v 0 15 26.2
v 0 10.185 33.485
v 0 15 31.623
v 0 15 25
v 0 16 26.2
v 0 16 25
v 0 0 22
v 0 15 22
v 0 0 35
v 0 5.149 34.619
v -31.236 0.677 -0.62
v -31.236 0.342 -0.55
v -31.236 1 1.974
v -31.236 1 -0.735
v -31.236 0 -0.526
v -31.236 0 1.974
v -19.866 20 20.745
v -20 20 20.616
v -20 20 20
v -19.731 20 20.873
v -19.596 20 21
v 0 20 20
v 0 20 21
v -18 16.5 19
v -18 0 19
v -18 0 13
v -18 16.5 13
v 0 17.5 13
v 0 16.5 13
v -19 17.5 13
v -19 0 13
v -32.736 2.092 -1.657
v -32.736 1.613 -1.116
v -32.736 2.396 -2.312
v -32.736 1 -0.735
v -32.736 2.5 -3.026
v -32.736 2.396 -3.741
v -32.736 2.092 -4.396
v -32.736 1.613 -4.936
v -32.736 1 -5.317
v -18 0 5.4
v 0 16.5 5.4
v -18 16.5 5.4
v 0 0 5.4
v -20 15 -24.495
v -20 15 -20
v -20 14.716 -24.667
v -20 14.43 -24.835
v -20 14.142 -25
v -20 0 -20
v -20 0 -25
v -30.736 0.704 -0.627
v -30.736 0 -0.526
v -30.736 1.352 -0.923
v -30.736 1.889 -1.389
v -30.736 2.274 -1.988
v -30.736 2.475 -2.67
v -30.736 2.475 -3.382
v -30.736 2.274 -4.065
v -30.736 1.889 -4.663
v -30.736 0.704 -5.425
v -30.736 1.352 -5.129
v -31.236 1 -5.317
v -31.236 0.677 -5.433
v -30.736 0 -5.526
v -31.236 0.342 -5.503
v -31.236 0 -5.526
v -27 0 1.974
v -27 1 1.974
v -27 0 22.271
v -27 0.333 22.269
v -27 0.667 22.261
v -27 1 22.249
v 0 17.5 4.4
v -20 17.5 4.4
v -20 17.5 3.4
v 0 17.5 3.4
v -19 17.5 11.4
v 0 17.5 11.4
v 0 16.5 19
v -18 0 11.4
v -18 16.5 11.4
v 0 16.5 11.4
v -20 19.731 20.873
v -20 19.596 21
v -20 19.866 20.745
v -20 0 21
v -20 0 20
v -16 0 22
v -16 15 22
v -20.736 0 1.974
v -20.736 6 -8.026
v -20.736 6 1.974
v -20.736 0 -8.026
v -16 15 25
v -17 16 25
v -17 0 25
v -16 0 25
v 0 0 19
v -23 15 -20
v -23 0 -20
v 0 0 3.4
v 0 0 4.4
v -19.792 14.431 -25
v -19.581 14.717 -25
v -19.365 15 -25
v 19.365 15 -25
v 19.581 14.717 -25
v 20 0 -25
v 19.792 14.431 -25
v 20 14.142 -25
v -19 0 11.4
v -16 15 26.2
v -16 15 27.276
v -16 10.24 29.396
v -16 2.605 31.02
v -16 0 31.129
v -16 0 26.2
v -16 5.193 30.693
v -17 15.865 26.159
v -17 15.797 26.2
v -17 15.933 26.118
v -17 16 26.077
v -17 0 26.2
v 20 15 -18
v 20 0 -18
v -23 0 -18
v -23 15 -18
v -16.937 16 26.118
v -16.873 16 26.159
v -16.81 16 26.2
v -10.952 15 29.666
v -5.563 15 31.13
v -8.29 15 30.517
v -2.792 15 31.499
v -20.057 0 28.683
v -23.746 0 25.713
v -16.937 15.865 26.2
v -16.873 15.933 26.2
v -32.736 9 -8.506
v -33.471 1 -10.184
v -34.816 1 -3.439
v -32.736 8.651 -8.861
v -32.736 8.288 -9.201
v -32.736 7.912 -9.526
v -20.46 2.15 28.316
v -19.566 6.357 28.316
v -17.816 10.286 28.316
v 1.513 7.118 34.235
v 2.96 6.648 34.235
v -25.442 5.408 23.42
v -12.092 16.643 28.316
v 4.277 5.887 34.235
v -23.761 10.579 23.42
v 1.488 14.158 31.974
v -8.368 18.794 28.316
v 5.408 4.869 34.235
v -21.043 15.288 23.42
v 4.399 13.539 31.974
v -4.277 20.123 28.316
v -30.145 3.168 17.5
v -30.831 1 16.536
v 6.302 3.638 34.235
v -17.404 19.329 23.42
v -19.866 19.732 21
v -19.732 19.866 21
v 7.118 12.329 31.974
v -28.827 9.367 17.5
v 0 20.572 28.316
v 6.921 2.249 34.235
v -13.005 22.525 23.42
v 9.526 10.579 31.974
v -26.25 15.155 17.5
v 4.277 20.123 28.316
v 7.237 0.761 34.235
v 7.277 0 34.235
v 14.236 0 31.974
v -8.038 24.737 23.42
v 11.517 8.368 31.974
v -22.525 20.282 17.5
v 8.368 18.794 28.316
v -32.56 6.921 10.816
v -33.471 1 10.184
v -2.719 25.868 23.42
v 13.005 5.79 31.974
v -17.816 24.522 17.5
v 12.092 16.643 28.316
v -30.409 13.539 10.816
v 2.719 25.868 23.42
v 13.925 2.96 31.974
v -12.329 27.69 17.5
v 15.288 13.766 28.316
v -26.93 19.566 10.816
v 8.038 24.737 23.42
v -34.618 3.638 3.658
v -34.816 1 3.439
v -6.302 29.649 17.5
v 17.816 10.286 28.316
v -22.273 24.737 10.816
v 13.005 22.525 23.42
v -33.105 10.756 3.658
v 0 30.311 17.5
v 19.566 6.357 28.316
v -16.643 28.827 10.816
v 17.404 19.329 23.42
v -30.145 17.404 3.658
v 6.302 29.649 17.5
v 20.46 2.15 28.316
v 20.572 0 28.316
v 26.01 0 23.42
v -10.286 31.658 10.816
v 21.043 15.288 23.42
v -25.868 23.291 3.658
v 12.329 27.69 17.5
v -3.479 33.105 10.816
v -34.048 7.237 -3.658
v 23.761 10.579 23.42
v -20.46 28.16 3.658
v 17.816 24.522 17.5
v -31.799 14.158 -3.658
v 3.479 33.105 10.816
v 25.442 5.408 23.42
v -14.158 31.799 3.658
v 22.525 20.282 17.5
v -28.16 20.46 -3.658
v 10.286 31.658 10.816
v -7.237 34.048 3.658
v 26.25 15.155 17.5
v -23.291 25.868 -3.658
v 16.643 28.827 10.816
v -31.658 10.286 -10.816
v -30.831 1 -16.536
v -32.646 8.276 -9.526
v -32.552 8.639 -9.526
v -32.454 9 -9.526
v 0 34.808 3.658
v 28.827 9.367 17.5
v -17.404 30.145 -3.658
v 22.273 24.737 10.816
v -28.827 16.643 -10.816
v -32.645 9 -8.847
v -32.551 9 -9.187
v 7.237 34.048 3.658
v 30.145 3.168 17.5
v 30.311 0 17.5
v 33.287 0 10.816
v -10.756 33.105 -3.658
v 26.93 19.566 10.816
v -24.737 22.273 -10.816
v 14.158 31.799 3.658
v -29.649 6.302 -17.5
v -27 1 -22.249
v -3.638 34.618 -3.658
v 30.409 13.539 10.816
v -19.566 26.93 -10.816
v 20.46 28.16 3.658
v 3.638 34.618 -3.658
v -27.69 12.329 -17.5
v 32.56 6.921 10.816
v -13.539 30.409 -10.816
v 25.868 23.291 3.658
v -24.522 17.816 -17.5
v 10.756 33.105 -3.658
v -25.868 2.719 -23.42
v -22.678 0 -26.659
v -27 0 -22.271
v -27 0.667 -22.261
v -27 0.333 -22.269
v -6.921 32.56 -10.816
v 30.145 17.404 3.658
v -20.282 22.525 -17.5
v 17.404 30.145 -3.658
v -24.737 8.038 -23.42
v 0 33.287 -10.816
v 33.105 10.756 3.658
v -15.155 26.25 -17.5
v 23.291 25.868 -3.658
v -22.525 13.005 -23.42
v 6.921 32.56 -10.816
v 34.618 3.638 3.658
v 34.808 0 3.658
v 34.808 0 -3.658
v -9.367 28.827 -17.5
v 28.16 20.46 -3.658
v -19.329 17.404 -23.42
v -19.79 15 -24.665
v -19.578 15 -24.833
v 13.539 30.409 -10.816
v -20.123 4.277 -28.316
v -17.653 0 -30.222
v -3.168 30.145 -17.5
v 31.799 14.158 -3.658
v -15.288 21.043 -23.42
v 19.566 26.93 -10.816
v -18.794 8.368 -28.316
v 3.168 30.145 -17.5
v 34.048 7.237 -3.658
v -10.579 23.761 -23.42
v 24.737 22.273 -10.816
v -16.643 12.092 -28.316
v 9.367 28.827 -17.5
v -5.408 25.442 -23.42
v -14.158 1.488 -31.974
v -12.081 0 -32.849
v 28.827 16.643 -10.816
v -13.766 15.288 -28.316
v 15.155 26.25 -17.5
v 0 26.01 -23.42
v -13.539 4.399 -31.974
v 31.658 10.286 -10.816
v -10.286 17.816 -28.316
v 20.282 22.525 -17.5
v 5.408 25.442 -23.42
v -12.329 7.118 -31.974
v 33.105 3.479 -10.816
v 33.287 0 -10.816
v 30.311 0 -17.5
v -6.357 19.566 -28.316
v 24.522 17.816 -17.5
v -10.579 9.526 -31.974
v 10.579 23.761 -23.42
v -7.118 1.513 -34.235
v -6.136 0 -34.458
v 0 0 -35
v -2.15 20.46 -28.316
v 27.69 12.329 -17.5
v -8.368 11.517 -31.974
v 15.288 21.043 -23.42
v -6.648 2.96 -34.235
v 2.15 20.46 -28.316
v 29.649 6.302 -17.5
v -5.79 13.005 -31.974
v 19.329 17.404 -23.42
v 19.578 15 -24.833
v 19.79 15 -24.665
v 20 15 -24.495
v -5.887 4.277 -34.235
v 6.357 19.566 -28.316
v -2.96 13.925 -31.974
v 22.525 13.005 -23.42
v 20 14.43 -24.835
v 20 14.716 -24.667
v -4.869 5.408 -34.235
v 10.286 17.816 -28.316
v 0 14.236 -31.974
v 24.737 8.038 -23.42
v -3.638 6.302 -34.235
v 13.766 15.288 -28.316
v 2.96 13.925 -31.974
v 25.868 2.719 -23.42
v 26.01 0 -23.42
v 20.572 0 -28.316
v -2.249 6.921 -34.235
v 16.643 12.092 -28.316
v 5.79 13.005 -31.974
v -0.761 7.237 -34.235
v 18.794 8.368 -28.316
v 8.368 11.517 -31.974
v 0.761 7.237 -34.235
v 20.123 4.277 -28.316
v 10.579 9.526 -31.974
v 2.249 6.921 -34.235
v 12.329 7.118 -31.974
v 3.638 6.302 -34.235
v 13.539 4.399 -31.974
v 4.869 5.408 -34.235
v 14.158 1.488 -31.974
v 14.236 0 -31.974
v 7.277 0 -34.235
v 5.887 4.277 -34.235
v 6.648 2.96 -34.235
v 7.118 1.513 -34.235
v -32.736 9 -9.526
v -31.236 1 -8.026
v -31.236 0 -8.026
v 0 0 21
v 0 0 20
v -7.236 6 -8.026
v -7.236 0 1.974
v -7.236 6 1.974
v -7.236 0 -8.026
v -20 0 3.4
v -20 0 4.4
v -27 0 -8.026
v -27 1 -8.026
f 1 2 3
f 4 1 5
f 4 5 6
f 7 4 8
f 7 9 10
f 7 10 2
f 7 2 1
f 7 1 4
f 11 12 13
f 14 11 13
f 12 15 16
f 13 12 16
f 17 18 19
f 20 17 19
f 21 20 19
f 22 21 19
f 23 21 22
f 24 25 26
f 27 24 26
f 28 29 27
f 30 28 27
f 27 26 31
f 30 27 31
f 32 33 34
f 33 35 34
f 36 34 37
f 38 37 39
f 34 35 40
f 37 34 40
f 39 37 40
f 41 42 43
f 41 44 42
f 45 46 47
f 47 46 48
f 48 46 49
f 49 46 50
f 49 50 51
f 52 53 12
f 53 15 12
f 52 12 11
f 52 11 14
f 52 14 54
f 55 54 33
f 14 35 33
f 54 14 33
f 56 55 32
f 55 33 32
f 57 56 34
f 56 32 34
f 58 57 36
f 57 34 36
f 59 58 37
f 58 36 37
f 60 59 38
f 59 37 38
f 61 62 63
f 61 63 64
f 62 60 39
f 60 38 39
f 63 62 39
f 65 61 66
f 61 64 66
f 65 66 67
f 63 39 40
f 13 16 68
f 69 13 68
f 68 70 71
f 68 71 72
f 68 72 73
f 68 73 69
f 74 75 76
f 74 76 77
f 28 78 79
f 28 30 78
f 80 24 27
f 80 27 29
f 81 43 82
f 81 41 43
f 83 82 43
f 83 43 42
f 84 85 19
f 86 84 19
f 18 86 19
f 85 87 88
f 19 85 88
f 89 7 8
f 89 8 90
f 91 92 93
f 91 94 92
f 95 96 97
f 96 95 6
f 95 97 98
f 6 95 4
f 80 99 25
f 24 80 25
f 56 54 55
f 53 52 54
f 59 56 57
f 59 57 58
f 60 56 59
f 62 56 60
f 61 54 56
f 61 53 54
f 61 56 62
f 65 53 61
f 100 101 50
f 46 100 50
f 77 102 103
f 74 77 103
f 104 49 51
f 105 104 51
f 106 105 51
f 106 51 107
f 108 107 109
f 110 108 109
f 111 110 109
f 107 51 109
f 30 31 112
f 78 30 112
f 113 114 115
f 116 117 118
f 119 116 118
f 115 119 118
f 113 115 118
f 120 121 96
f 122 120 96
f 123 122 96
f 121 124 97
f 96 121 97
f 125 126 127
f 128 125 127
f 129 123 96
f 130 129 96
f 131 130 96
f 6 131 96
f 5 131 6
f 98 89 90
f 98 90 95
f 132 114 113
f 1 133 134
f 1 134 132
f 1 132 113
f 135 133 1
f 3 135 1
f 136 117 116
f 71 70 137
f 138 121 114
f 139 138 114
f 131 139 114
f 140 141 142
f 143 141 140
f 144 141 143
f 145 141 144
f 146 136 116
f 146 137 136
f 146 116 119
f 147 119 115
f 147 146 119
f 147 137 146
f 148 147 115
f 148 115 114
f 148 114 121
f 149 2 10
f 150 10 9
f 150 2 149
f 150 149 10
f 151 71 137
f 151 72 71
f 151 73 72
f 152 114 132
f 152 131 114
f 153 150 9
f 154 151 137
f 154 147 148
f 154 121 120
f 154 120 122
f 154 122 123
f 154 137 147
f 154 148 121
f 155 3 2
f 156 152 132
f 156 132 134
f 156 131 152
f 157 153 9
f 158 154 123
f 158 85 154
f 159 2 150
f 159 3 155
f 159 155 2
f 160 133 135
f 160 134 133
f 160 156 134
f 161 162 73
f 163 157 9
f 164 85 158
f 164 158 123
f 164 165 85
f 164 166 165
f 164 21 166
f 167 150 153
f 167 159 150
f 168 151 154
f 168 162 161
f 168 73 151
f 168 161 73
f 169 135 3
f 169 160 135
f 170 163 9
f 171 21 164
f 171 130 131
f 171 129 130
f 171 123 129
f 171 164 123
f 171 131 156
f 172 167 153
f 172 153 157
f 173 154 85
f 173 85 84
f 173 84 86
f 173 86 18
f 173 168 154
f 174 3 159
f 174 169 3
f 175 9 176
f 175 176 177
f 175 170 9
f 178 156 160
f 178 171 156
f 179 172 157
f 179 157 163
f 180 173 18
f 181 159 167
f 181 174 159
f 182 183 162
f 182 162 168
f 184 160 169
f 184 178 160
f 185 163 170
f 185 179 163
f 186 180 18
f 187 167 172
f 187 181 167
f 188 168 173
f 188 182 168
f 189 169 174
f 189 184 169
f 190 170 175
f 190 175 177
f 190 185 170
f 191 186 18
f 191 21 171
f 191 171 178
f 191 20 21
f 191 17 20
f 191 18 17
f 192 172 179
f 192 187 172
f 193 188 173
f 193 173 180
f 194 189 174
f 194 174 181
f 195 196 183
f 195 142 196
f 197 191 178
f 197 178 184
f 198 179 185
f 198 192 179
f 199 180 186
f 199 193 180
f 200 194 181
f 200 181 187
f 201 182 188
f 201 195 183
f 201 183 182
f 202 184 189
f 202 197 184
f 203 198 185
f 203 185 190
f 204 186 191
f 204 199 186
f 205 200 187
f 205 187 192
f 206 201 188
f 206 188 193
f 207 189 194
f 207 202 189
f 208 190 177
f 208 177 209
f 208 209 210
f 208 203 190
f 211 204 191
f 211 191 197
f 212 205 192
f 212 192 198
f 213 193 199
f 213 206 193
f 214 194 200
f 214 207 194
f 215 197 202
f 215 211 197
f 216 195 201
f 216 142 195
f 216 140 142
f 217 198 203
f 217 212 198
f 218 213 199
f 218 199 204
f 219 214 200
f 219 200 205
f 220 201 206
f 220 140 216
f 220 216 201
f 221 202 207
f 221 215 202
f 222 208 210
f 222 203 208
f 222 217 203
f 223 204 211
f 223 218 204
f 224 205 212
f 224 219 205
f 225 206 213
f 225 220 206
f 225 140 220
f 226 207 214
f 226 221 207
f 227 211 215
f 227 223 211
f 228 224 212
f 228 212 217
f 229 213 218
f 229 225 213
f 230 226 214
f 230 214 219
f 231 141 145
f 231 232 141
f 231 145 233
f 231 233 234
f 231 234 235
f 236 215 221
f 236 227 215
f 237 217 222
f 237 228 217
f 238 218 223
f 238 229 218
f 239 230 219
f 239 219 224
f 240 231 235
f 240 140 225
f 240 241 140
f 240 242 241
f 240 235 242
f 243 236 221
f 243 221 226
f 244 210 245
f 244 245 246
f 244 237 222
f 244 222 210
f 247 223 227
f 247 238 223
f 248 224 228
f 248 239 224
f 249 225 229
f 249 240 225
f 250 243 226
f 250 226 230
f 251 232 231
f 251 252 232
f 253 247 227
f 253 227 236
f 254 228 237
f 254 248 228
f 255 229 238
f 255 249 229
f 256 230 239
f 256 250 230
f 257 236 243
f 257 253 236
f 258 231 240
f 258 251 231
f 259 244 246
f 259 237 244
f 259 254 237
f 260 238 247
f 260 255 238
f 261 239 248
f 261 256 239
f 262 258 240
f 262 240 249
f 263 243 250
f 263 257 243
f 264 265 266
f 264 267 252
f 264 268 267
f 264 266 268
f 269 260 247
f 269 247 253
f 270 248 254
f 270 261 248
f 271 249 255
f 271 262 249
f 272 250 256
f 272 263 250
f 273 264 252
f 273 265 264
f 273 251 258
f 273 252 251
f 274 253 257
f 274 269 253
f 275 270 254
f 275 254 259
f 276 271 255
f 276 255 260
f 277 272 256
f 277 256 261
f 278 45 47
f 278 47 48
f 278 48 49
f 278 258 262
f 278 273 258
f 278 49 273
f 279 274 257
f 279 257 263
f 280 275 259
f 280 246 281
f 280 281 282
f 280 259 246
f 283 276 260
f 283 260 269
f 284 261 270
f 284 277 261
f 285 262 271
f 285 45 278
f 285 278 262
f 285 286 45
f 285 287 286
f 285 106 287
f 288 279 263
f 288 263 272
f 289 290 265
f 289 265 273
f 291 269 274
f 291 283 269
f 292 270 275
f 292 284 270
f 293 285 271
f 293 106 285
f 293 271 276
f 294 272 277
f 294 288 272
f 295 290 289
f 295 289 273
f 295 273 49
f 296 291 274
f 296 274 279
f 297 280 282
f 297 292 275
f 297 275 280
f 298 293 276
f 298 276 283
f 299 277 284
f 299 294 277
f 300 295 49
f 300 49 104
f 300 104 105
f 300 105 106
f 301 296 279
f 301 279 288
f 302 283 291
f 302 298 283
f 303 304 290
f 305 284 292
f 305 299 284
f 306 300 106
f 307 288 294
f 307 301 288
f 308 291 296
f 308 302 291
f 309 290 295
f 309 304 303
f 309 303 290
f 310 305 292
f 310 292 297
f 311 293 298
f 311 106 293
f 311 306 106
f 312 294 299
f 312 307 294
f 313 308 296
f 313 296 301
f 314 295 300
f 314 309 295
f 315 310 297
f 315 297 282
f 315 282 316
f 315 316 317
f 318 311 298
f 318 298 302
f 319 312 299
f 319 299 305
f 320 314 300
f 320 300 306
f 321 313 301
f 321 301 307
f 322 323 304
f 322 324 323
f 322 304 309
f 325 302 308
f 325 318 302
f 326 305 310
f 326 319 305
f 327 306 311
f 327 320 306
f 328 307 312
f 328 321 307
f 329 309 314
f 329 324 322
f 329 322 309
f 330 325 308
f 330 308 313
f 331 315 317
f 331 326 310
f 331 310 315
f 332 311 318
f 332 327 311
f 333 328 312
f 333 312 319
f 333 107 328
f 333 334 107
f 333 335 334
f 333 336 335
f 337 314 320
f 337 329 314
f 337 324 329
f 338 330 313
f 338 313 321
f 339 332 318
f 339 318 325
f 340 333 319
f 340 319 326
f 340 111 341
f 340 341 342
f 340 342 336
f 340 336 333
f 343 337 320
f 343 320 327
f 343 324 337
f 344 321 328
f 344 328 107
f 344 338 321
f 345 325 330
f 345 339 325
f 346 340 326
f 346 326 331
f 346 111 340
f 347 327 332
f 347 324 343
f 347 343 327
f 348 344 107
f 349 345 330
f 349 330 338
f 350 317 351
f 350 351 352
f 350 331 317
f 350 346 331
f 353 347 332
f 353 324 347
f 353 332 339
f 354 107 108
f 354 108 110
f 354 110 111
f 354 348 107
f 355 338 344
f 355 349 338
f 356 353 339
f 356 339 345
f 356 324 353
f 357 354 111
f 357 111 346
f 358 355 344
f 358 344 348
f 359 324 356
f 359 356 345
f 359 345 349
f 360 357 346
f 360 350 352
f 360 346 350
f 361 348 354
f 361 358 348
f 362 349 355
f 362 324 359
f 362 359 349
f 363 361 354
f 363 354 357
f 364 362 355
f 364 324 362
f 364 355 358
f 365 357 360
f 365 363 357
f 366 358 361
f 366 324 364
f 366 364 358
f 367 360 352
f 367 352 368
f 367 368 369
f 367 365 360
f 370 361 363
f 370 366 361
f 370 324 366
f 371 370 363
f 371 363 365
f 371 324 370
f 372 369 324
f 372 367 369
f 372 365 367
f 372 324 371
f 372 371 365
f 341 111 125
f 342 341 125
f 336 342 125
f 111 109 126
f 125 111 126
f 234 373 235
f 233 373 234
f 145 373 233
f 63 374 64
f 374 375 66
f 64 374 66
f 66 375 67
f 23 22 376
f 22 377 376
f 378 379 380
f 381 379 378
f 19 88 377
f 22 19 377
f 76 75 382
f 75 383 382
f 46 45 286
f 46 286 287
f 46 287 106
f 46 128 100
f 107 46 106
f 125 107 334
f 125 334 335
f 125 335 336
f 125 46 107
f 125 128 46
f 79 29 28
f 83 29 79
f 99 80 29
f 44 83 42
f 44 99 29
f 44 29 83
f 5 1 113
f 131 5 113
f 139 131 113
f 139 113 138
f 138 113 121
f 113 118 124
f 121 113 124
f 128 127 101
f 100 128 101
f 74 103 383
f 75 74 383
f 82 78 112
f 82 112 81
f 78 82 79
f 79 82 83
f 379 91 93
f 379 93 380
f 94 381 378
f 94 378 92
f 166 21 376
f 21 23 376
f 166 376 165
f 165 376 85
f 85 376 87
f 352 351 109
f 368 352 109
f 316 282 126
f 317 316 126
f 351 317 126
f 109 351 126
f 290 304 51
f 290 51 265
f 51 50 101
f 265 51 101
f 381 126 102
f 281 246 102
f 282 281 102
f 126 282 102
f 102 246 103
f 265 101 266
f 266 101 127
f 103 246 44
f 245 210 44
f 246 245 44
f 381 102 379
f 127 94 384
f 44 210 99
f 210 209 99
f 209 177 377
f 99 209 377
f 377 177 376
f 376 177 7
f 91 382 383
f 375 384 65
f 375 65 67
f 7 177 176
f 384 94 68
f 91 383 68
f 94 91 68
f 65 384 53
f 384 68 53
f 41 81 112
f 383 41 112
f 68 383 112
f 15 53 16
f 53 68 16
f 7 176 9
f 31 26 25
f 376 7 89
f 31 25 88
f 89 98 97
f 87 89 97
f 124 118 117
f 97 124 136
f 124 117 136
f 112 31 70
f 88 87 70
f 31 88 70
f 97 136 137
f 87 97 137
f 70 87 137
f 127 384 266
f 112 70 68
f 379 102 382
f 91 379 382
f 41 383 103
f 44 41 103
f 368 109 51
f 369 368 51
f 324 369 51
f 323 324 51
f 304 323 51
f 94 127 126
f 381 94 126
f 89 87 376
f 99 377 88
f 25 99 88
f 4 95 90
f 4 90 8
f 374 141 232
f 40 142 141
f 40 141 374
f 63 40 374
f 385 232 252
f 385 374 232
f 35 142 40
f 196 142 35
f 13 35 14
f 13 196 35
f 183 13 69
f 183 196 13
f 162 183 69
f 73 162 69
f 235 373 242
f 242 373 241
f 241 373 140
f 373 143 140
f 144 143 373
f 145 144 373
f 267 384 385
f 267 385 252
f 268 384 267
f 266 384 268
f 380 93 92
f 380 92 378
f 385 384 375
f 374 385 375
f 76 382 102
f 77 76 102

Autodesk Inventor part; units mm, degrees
ref_plane "YZ Plane" through (0, 0, 0) normal (1, 0, 0) x (0, 1, 0)
ref_plane "XZ Plane" through (0, 0, 0) normal (0, 1, 0) x (-1, 0, 0)
ref_plane "XY Plane" through (0, 0, 0) normal (0, 0, 1) x (1, 0, 0)
sketch "スケッチ1" plane through (0, 0, 0) normal (0, 1, 0) x (-1, 0, 0)
  circle A0 centre (0, 0) radius 35
  line L0 (0, 0) -> (0, -35)
  line L1 (0, 0) -> (0, 35)
  dimension "d0" = 70
revolve "回転1" add sketch "スケッチ1" angle 180 about axis through (0, 0, 0) along (0, 0, 1) picked at (-2.5961, -23.0408) contours L1 L0 A0
sketch "スケッチ5" plane through (0, 0, 0) normal (0, -1, 0) x (1, 0, 0)
  line L0 (-20, -25) -> (20, -25)
  line L1 (20, -25) -> (20, -18)
  line L2 (20, -18) -> (-20, -18)
  line L3 (-20, -18) -> (-20, -25)
  line L4 (-20, -18) -> (-23, -18)
  line L5 (-23, -18) -> (-23, -20)
  line L6 (-23, -20) -> (-20, -20)
  line L7 (-20, -20) -> (-20, -18)
  line L8 (0, 26.2) -> (-17, 26.2)
  line L9 (-17, 26.2) -> (-17, 25)
  line L10 (-17, 25) -> (0, 25)
  line L11 (0, 25) -> (0, 26.2)
  line L12 (0, 21) -> (-20, 21)
  line L13 (-20, 21) -> (-20, 20)
  line L14 (-20, 20) -> (0, 20)
  line L15 (0, 20) -> (0, 21)
  line L16 (0, 13) -> (-19, 13)
  line L17 (-19, 13) -> (-19, 11.4)
  line L18 (-19, 11.4) -> (0, 11.4)
  line L19 (0, 11.4) -> (0, 13)
  line L20 (0, 4.4) -> (-20, 4.4)
  line L21 (-20, 4.4) -> (-20, 3.4)
  line L22 (-20, 3.4) -> (0, 3.4)
  line L23 (0, 3.4) -> (0, 4.4)
  circle A0 centre (0, 0) radius 35 projected
  circle A1 centre (0, 0) radius 35 projected
  line L24 (0, 35) -> (0, -35)
  line L25 (35, 0) -> (-35, 0)
  line L26 (-31.236, 1.9738) -> (-22.236, 1.9738)
  line L27 (-22.236, 1.9738) -> (-22.236, -8.0262)
  line L28 (-22.236, -8.0262) -> (-31.236, -8.0262)
  line L29 (-31.236, -8.0262) -> (-31.236, 1.9738)
  line L30 (-22.236, 1.9738) -> (-7.236, 1.9738)
  line L31 (-7.236, 1.9738) -> (-7.236, -8.0262)
  line L32 (-7.236, -8.0262) -> (-22.236, -8.0262)
  line L33 (-22.236, -8.0262) -> (-22.236, 1.9738)
  line L34 (-27, 22.2711) -> (-27, -22.2711)
  line L35 (-20.736, 3.4738) -> (-32.736, 3.4738)
  line L36 (-32.736, 3.4738) -> (-32.736, -9.5262)
  line L37 (-32.736, -9.5262) -> (-20.736, -9.5262)
  line L38 (-20.736, -9.5262) -> (-20.736, 3.4738)
  line L39 (-20.736, 3.4738) -> (-32.736, -9.5262) construction
  line L40 (-32.736, 3.4738) -> (-20.736, -9.5262) construction
  line L41 (-16, 26.2) -> (0, 26.2)
  line L42 (0, 26.2) -> (0, 35)
  line L43 (0, 35) -> (-16, 35)
  line L44 (-16, 35) -> (-16, 26.2)
  line L45 (-16, 25) -> (0, 25)
  line L46 (0, 25) -> (0, 22)
  line L47 (0, 22) -> (-16, 22)
  line L48 (-16, 22) -> (-16, 25)
  line L49 (-18, 13) -> (0, 13)
  line L50 (0, 13) -> (0, 19)
  line L51 (0, 19) -> (-18, 19)
  line L52 (-18, 19) -> (-18, 13)
  line L53 (-18, 11.4) -> (0, 11.4)
  line L54 (0, 11.4) -> (0, 5.4)
  line L55 (0, 5.4) -> (-18, 5.4)
  line L56 (-18, 5.4) -> (-18, 11.4)
  line L57 (-22.236, -3.0262) -> (-37.4009, -3.0262)
  point P0 (0, -25)
  point P1 (0, -18)
  point P2 (-20, -20)
  point P3 (0, 25.6)
  point P4 (0, 20.5)
  point P5 (0, 12.2)
  point P6 (0, 3.9)
  point P7 (-20, -21.5)
  point P8 (-27, 1.9738)
  point P9 (-27, -8.0262)
  point P10 (-26.736, -3.0262)
  point P11 (-16, 23.5)
  point P12 (-16, 31.1288)
  point P13 (0, 25)
  point P14 (0, 11.4)
  dimension "d12" = 40
  dimension "d13" = 7
  dimension "d21" = 3
  dimension "d22" = 2
  dimension "d23" = 17
  dimension "d24" = 1.2
  dimension "d27" = 20
  dimension "d28" = 1
  dimension "d30" = 19
  dimension "d31" = 1.6
  dimension "d33" = 1
  dimension "d88" = 0
  dimension "d89" = 0
  dimension "d90" = 10
  dimension "d92" = 20
  dimension "d93" = 8.8
  dimension "d94" = 14
  dimension "d95" = 22
  dimension "d96" = 30.6
  dimension "d97" = 9
  dimension "d98" = 10
  dimension "d99" = 1.4262
  dimension "d100" = 2.236
  dimension "d101" = 15
  dimension "d102" = 9.9738
  dimension "d113" = 27
  dimension "d116" = 12
  dimension "d117" = 13
  dimension "d120" = 0.0738
  dimension "d121" = 0.736
  dimension "d122" = 16
  dimension "d123" = 35
  dimension "d124" = 3
  dimension "d125" = 16
  dimension "d126" = 6
  dimension "d127" = 6
  dimension "d128" = 18
  dimension "d129" = 18
extrude "GNSボード" cut sketch "スケッチ5" against normal blind 16 contours L11 L10 L9 L8
extrude "GNSボード止めるよう" cut sketch "スケッチ5" against normal blind 15 contours L24 L8 L44 A0 | L24 L47 L48 L10
extrude "アルミ板１" cut sketch "スケッチ5" against normal blind 20 contours L15 L14 L13 L12
extrude "メイン基板" cut sketch "スケッチ5" against normal blind 17.5 contours L18 L17 L16 L19
extrude "メイン止めるよう" cut sketch "スケッチ5" against normal blind 16.5 contours L55 L56 L18 L24 | L16 L52 L51 L24
extrude "アルミ板２" cut sketch "スケッチ5" against normal blind 17.5 contours L22 L21 L20 L23
extrude "モーター" cut sketch "スケッチ5" against normal blind 6 contours L31 L32 L38 L25 | L25 L38 L30 L31 | L38 L32 L27 L25 | L25 L27 L30 L38 | L34 L57 L27 L28 | L28 L29 L57 L34 | L27 L57 L34 L25 | L25 L34 L26 L27 | L29 L25 L34 L57 | L25 L29 L26 L34
extrude "モーター受け" add sketch "スケッチ5" against normal blind 9 contours L37 L36 L57 L29 L28 L34 | L34 L28 L32 L38 L37 | L38 L32 L27 L25 | L25 L27 L30 L38 | L36 L25 L29 L57 | L34 L57 L27 L28 | L28 L29 L57 L34 | L27 L57 L34 L25 | L25 L34 L26 L27 | L30 L26 L34 L35 L38 | L36 L35 L34 L26 L29 L25 | L29 L25 L34 L57 | L25 L29 L26 L34
extrude "電池ボックス入れ" cut sketch "スケッチ5" against normal blind 15 contours L3 L2 L24 L0 | L24 L2 L1 L0 | L6 L5 L4 L3
extrude "サイドかっと" cut sketch "スケッチ5" against normal blind 1 contours A0 L57 L36 L37 L34 | A0 L25 L36 L57 | L37 L36 L57 L29 L28 L34 | A0 L34 L35 L36 L25 | L36 L25 L29 L57 | L36 L35 L34 L26 L29 L25
ref_plane "作業平面3" through (-32.736, 9, -9.5262) normal (-1, 0, 0) x (0, 0, -1)
sketch "スケッチ23" plane through (-32.736, 9, -9.5262) normal (-1, 0, 0) x (0, 0, -1)
  line L0 (-11.5, 9) -> (-1.5, 9) projected
  circle A0 centre (-6.5, 9) radius 2.5
  point P0 (-9.5262, 9)
  dimension "d134" = 5
extrude "押し出し21" cut sketch "スケッチ23" against normal blind 2
properties part number "naibu"
